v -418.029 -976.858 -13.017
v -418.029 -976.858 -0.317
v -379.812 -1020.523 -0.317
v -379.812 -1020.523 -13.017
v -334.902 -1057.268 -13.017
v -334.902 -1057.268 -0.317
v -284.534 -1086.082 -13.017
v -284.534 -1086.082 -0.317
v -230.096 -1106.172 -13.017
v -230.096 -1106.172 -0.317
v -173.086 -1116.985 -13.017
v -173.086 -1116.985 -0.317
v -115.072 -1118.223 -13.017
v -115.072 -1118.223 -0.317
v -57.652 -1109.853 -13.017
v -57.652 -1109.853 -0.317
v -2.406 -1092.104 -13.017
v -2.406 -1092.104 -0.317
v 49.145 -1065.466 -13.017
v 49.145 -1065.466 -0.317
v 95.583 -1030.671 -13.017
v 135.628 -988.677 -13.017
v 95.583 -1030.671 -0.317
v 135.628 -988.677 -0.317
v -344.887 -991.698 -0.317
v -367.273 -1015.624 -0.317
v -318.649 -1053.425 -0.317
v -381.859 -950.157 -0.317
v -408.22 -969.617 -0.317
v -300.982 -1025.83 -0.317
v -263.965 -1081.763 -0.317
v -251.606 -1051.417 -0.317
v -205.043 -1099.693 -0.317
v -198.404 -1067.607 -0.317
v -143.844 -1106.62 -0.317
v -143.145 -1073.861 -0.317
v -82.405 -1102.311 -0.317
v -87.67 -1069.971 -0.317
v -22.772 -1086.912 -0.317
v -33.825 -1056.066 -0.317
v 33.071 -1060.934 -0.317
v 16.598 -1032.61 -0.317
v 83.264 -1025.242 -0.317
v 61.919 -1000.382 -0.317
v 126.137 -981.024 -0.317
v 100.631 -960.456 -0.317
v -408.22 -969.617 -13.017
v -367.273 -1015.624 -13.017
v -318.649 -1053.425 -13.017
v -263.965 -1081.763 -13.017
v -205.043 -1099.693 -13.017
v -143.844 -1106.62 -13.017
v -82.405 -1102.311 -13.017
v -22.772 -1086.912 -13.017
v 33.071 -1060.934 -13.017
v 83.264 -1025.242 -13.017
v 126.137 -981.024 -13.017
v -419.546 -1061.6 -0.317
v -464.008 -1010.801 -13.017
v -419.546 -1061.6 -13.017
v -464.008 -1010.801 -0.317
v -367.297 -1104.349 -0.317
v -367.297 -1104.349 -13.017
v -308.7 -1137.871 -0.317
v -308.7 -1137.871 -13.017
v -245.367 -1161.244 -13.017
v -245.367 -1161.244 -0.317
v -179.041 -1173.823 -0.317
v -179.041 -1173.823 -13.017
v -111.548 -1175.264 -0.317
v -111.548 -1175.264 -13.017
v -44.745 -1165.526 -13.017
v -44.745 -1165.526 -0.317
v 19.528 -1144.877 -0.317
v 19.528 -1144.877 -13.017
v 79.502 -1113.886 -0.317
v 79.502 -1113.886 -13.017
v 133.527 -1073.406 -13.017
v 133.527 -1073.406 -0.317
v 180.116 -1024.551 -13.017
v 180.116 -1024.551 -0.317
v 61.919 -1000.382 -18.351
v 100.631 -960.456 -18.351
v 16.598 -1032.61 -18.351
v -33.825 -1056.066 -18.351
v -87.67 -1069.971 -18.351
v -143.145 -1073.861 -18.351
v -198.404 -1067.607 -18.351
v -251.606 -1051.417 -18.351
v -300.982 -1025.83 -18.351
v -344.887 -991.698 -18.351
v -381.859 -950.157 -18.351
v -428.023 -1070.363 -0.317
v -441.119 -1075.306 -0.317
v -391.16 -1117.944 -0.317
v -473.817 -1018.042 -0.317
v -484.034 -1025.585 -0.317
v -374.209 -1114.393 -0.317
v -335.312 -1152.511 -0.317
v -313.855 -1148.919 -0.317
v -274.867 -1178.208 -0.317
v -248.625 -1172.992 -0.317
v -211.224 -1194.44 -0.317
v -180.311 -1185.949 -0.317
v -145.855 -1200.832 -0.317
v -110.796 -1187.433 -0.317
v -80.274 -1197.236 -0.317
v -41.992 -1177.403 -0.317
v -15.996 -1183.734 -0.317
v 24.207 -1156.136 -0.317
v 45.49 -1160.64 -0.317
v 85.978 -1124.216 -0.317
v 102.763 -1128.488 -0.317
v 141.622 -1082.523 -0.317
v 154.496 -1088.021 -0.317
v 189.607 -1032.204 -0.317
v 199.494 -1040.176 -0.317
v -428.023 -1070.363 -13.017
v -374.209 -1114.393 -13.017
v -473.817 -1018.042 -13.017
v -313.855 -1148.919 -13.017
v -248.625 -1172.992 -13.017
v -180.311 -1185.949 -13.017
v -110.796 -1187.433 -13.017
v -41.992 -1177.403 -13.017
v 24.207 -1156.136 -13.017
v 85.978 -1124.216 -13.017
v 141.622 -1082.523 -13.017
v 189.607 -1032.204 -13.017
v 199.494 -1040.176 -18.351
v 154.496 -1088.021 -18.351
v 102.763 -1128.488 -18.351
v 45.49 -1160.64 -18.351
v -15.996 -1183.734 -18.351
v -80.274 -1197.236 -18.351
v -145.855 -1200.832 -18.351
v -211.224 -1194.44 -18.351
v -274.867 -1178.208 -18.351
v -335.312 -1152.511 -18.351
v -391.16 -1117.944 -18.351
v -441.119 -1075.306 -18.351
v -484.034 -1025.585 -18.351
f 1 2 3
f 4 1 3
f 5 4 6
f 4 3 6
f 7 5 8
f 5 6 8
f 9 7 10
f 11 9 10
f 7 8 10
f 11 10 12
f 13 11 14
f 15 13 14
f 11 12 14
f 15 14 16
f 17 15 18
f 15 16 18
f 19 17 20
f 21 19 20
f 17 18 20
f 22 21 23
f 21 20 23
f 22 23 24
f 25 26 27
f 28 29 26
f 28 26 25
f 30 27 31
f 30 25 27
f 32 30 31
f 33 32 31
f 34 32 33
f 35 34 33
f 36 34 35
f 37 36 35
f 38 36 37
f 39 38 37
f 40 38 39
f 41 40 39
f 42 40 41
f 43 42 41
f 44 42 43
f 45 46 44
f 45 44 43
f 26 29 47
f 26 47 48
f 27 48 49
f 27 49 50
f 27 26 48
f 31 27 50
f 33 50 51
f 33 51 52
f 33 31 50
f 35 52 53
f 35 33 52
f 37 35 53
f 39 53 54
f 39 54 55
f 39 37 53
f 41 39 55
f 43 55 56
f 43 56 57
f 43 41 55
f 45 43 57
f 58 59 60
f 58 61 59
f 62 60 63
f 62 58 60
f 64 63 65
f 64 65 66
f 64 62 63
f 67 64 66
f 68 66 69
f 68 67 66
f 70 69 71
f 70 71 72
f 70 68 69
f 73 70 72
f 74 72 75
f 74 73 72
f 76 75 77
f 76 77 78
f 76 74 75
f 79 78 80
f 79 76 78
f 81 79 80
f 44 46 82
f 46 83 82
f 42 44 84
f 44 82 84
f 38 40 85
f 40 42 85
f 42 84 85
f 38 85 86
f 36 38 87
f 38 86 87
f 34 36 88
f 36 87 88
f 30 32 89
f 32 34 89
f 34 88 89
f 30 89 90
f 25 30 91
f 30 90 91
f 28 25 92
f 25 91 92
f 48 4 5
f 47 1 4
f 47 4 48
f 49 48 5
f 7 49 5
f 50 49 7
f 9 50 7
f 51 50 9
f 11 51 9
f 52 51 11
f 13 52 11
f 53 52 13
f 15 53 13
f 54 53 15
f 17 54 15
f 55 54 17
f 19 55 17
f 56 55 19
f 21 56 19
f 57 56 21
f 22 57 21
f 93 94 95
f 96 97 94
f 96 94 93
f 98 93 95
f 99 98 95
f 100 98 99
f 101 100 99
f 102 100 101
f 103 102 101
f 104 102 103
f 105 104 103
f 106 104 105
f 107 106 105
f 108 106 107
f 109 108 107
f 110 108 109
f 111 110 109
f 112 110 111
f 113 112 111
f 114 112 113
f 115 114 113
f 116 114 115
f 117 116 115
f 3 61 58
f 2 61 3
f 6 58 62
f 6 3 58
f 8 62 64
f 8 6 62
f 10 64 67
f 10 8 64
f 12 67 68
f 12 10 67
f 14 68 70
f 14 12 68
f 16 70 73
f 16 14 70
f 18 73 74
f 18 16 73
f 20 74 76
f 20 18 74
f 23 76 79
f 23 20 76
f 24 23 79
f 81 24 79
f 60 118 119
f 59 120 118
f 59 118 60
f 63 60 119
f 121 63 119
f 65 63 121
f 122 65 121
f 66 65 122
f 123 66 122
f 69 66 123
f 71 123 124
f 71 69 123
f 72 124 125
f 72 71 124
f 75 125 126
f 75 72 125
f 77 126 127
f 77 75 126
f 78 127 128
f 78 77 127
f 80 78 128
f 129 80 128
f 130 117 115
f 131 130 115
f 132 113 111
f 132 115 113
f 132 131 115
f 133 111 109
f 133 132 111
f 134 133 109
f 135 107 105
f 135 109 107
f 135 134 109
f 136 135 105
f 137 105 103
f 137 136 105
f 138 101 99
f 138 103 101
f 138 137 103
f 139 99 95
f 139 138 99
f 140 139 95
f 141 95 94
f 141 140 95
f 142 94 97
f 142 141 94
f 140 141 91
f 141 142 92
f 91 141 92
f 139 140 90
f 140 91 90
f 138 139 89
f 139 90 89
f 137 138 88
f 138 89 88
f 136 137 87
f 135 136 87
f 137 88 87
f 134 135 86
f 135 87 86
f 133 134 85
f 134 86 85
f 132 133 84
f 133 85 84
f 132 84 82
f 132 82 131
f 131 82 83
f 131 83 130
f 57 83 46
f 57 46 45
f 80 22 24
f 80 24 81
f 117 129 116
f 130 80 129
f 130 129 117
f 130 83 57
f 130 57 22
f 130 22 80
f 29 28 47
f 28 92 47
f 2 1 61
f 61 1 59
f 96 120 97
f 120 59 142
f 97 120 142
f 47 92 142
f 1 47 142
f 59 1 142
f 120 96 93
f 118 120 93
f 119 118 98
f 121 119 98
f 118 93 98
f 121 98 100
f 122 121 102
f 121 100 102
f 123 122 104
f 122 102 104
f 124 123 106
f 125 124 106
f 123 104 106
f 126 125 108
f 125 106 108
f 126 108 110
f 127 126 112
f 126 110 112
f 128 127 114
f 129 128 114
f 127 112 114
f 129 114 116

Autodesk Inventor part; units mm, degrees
ref_plane "YZ Plane" through (0, 0, 0) normal (1, 0, 0) x (0, 1, 0)
ref_plane "XZ Plane" through (0, 0, 0) normal (0, 1, 0) x (-1, 0, 0)
ref_plane "Work Plane1" through (22.5184, 2.463, -18.3509) normal (0, 0, 1) x (0.9997722, -0.0213418, 0)
sketch "ThermoBulbBorder" plane through (22.5184, 2.463, -18.3509) normal (0, 0, 1) x (0.9997722, -0.0213418, 0)
  arc A0 (-447.455, -468.958) -> (162.145, -468.958) centre (-142.655, -774.8145) ccw
  arc A1 (-447.455, -468.958) -> (162.145, -468.958) centre (-142.655, -774.8145) ccw
  arc A2 (-383.955, -588.5959) -> (98.645, -588.5959) centre (-142.655, -774.8145) ccw
  line L0 (-447.455, -468.958) -> (-383.955, -468.958)
  line L1 (-383.955, -468.958) -> (-383.955, -588.5959)
  line L2 (162.145, -468.958) -> (98.645, -468.958)
  line L3 (98.645, -468.958) -> (98.645, -588.5959)
  line L4 (-383.955, -961.033) -> (-484.4967, -1038.6241)
  line L5 (98.645, -961.033) -> (199.1867, -1038.6241)
  arc A3 (-447.455, -468.958) -> (162.145, -468.958) centre (-142.655, -774.8145) ccw projected
  circle A4 centre (-142.655, -774.8145) radius 419.1 construction
  circle A5 centre (-142.655, -774.8145) radius 406.908 construction
  circle A6 centre (-142.655, -774.8145) radius 349.758 construction
  circle A7 centre (-142.655, -774.8145) radius 337.566 construction
  line L6 (98.645, -468.958) -> (98.645, -316.558) construction
  line L7 (-383.955, -468.958) -> (-383.955, -316.558) construction
  dimension "d0" = 609.6
  dimension "d5" = 63.5
  dimension "d6" = 63.5
  dimension "d7" = 838.2
  dimension "d8" = 12.192
  dimension "d9" = 12.192
  dimension "d10" = 57.15
  dimension "d11" = 32.766
  dimension "d12" = 152.4
extrude "Extrusion2" add sketch "ThermoBulbBorder" along normal blind 18.034 contours L4 A2 L5 A0
sketch "Sketch2" plane through (22.5184, 2.463, -0.3169) normal (0, 0, 1) x (0.9997722, -0.0213418, 0)
  line L0 (-383.955, -961.033) -> (-484.4967, -1038.6241) projected
  arc A0 (-484.4967, -1038.6241) -> (199.1867, -1038.6241) centre (-142.655, -774.8145) ccw projected
  line L1 (199.1867, -1038.6241) -> (98.645, -961.033) projected
  arc A1 (-383.955, -961.033) -> (98.645, -961.033) centre (-142.655, -774.8145) ccw projected
  arc A2 (-409.8948, -981.0515) -> (124.5847, -981.0515) centre (-142.655, -774.8145) ccw
  arc A3 (-419.5468, -988.5003) -> (134.2367, -988.5003) centre (-142.655, -774.8145) ccw
  arc A4 (-464.7905, -1023.4163) -> (179.4805, -1023.4163) centre (-142.655, -774.8145) ccw
  arc A5 (-474.4425, -1030.865) -> (189.1325, -1030.865) centre (-142.655, -774.8145) ccw
  line L2 (-474.4425, -1030.865) -> (-464.7905, -1023.4163)
  line L3 (-419.5468, -988.5003) -> (-409.8948, -981.0515)
  line L4 (124.5847, -981.0515) -> (134.2367, -988.5003)
  line L5 (179.4805, -1023.4163) -> (189.1325, -1030.865)
  point P0 (-22.4607, -2.943)
  dimension "d15" = 12.192
  dimension "d17" = 12.7
  dimension "d18" = 57.15
  dimension "d19" = 12.192
extrude "Extrusion3" cut sketch "Sketch2" against normal blind 12.7 contours A2 L1 A3 L0 | A4 L1 A5 L0
equation "\"d6\" = d5"
equation "\"d8\" = bRopeChannel"
equation "\"d9\" = bRopeChannel"
equation "\"d15\" = bRopeChannel"
equation "\"d19\" = bRopeChannel"
equation "\"bRopeChannel\" = 12.192"
properties part number "HOT Thermo bulb outline B" material "Rubber, Butyl"
